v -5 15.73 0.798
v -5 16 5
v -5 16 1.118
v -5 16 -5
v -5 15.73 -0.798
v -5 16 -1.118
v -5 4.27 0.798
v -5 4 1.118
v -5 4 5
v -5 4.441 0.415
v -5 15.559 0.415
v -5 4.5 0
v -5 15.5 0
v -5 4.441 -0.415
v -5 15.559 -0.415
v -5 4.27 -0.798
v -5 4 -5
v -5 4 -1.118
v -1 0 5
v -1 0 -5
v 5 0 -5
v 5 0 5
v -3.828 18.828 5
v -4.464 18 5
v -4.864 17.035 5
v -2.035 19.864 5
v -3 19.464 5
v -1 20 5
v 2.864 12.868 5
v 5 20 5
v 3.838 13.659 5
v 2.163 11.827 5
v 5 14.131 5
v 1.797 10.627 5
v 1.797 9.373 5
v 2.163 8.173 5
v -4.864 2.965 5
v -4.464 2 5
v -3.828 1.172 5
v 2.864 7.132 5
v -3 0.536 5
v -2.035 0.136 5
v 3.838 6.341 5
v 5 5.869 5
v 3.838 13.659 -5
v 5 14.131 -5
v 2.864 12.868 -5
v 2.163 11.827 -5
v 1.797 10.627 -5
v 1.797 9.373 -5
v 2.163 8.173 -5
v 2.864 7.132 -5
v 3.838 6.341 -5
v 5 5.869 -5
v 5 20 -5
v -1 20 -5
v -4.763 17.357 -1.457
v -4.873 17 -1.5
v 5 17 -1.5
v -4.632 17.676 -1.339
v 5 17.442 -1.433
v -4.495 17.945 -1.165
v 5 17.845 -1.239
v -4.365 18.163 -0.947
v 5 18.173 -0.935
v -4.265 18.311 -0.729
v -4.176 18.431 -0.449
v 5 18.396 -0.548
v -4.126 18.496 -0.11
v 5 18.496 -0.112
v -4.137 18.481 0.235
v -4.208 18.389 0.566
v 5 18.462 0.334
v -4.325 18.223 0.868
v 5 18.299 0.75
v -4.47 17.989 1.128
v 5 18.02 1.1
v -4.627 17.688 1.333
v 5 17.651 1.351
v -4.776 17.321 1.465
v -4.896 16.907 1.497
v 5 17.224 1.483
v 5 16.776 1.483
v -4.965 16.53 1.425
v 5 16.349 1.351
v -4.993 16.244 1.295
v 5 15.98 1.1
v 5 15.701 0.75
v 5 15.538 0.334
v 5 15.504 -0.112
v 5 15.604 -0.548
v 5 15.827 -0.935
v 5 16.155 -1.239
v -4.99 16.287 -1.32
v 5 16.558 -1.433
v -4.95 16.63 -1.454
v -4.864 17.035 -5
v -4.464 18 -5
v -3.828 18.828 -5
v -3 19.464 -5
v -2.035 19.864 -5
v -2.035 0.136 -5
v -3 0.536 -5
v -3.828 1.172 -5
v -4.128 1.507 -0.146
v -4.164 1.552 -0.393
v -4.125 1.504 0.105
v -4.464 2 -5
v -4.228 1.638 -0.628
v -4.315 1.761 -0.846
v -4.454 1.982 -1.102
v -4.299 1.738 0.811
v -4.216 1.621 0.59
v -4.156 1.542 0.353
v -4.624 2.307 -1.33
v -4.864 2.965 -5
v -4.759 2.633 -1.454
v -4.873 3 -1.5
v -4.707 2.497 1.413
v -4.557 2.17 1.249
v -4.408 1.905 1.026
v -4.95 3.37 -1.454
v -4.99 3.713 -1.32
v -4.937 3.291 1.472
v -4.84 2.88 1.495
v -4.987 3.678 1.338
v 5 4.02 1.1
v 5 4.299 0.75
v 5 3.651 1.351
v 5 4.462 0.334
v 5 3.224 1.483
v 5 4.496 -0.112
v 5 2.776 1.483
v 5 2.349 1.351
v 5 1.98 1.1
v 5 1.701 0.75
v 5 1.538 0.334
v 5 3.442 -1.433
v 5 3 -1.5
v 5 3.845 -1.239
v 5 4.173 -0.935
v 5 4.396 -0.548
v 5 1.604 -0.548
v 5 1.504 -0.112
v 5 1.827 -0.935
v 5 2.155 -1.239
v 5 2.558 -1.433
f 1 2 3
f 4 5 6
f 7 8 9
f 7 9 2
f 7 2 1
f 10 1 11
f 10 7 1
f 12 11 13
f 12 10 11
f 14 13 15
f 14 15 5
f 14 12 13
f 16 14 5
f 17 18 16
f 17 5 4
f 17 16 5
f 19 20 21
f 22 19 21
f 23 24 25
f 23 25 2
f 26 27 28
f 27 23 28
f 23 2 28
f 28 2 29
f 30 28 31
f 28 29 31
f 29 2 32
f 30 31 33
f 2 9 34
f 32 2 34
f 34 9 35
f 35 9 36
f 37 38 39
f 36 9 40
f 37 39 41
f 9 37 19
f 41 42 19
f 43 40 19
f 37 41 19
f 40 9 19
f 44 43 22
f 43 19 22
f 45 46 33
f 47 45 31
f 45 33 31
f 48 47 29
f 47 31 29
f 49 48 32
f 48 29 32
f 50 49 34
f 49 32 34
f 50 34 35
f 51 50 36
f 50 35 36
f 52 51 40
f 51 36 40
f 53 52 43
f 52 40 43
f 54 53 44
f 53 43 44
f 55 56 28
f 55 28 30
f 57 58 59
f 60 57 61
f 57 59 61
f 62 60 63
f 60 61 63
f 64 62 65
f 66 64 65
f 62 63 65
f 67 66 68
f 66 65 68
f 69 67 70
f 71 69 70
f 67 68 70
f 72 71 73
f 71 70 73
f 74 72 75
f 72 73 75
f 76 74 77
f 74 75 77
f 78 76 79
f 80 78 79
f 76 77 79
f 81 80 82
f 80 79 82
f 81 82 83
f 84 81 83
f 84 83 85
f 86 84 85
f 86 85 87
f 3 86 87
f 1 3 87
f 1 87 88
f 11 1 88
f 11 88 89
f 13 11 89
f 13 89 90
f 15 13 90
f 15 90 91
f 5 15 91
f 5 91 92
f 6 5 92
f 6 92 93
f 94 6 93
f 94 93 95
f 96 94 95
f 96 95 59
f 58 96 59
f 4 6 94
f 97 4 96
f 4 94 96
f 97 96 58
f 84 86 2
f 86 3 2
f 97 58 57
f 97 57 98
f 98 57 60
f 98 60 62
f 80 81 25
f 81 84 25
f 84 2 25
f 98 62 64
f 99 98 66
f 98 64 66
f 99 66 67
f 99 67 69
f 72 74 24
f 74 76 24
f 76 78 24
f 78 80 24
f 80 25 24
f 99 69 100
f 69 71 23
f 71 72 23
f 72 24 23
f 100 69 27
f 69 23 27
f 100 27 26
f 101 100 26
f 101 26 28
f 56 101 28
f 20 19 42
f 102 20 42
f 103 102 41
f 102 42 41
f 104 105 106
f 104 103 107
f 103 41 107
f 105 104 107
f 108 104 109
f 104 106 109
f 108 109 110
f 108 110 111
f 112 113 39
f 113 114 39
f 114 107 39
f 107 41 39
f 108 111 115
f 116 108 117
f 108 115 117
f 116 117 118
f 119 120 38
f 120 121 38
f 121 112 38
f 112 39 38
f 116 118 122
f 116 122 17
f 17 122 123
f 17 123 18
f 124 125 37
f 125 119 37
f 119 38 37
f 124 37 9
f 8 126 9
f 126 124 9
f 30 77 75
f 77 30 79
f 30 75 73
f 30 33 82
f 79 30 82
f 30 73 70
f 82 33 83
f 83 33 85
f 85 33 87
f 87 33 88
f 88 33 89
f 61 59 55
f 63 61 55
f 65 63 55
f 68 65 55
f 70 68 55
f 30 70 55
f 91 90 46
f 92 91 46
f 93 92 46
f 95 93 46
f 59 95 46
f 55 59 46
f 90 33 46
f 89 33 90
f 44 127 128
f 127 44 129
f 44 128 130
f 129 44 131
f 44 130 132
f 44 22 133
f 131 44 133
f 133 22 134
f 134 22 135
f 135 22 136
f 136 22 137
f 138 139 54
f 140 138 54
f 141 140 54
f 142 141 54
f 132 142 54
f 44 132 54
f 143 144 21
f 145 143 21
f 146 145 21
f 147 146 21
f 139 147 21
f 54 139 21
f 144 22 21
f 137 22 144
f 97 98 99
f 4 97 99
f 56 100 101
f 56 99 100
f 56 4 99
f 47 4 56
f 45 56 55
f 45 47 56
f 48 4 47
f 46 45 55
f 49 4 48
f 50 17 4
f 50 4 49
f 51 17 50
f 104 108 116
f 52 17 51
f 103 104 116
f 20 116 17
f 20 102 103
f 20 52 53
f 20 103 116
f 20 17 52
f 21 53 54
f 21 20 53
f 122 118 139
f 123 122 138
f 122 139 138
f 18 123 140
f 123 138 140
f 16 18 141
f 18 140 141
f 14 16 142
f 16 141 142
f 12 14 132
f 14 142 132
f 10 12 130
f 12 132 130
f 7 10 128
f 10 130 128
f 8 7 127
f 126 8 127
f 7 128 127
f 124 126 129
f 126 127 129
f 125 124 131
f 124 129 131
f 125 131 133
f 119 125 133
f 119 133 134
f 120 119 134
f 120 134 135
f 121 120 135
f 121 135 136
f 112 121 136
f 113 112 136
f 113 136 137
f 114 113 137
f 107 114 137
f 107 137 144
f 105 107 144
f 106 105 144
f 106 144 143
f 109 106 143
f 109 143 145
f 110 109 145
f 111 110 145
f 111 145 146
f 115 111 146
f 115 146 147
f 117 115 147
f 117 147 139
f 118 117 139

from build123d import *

# Parameters (mm, degrees)
SKETCH1_W           = 10
SKETCH1_H           = 10
BOSS_EXTRUDE1_DEPTH = 20
SKETCH2_R           = 4.25
CUT_EXTRUDE1_DEPTH  = 23.912878475
SKETCH3_R           = 1.5
CUT_EXTRUDE2_DEPTH  = 23.912878475
FILLET1_R           = 4


with BuildPart() as part:
    # Sketch1 → Boss-Extrude1 (new body)
    with BuildSketch(Plane(origin=(0, 0, 0), x_dir=(1, 0, 0), z_dir=(0, 1, 0))):
        Rectangle(SKETCH1_W, SKETCH1_H)
    extrude(amount=BOSS_EXTRUDE1_DEPTH)

    # Sketch2 → Cut-Extrude1 (cut, through all)
    with BuildSketch(Plane.XY.offset(5)):
        with Locations((6, 10)):
            Circle(SKETCH2_R)
    extrude(amount=-CUT_EXTRUDE1_DEPTH, mode=Mode.SUBTRACT)

    # Sketch3 → Cut-Extrude2 (cut, through all)
    with BuildSketch(Plane(origin=(5, 0, 0), x_dir=(0, 0, -1), z_dir=(1, 0, 0))):
        with Locations((0, 3)):
            Circle(SKETCH3_R)
        with Locations((0, 17)):
            Circle(SKETCH3_R)
    extrude(amount=-CUT_EXTRUDE2_DEPTH, mode=Mode.SUBTRACT)

    # Fillet1
    # the kernel refuses this fillet: 4 mm, written as the material it takes off along each edge
    with BuildSketch(Plane(origin=(-5, 20, 15), x_dir=(0, -1, 0), z_dir=(0, 0, -1)), Plane(origin=(-5, 0, 15), x_dir=(1, 0, 0), z_dir=(0, 0, -1))) as fillet1_piece_1:
        with BuildLine():
            CenterArc((FILLET1_R, -FILLET1_R), FILLET1_R, 90, 90)
            Line((0, -FILLET1_R), (0, 0))
            Line((0, 0), (FILLET1_R, 0))
        make_face()
    extrude(amount=30, mode=Mode.SUBTRACT)


solid = part.part
